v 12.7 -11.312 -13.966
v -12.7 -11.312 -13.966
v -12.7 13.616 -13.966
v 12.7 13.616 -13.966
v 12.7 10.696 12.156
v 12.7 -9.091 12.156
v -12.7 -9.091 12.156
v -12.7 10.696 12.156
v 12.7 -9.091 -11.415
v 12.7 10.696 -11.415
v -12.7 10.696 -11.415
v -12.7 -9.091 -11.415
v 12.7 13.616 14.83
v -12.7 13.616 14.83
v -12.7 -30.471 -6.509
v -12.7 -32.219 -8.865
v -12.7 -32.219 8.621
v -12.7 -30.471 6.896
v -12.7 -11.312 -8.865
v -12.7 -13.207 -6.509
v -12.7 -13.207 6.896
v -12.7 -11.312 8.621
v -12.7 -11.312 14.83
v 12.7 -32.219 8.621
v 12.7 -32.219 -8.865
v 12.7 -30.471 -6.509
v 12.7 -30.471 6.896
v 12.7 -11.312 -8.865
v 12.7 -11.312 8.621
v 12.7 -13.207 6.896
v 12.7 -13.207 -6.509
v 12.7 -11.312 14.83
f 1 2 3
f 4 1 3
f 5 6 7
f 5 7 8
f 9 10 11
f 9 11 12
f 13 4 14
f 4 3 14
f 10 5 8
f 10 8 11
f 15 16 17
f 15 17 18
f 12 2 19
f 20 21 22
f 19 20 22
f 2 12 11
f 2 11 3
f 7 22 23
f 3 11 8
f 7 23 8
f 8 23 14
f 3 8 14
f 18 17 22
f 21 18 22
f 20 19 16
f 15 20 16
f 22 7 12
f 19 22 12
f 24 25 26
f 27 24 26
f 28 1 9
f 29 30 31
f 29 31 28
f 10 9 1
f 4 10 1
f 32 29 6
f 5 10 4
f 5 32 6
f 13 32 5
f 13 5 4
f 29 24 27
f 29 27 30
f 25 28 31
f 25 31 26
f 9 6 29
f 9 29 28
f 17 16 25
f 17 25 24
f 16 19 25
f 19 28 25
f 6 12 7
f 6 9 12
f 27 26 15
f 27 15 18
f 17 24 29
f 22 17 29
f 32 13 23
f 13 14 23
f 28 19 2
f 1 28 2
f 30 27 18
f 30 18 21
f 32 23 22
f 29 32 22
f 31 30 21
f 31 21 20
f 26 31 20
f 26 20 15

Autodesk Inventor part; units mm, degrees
ref_plane "YZ Plane" through (0, 0, 0) normal (1, 0, 0) x (0, 1, 0)
ref_plane "XZ Plane" through (0, 0, 0) normal (0, 1, 0) x (-1, 0, 0)
ref_plane "XY Plane" through (0, 0, 0) normal (0, 0, 1) x (1, 0, 0)
sketch "Sketch1" plane through (0, 0, 0) normal (1, 0, 0) x (0, 1, 0)
  line L0 (13.6162, 14.8297) -> (-11.3125, 14.8297)
  line L1 (-11.3125, 14.8297) -> (-11.3125, -13.9659)
  line L2 (-11.3125, -13.9659) -> (13.6162, -13.9659)
  line L3 (13.6162, -13.9659) -> (13.6162, 14.8297)
extrude "Extrusion1" add sketch "Sketch1" along normal mid plane 25.4
sketch "Sketch2" plane through (12.7, 0, 0) normal (1, 0, 0) x (0, 0, -1)
  line L0 (-12.1558, 10.6955) -> (11.4154, 10.6955)
  line L1 (11.4154, 10.6955) -> (11.4154, -9.0912)
  line L2 (11.4154, -9.0912) -> (-12.1558, -9.0912)
  line L3 (-12.1558, -9.0912) -> (-12.1558, 10.6955)
  point P0 (0, 0)
extrude "Extrusion2" cut sketch "Sketch2" against normal blind 25.4
sketch "Sketch3" plane through (12.7, 0, 0) normal (1, 0, 0) x (0, 0, -1)
  line L0 (-14.8297, -11.3125) -> (13.9659, -11.3125) projected
  line L1 (-8.621, -11.3125) -> (8.8651, -11.3125)
  line L2 (8.8651, -11.3125) -> (8.8651, -32.2195)
  line L3 (8.8651, -32.2195) -> (-8.621, -32.2195)
  line L4 (-8.621, -32.2195) -> (-8.621, -11.3125)
  point P0 (0, 0)
extrude "Extrusion3" add sketch "Sketch3" against normal blind 25.4
sketch "Sketch4" plane through (12.7, 0, 0) normal (1, 0, 0) x (0, 0, -1)
  line L0 (-6.8955, -13.2073) -> (6.5094, -13.2073)
  line L1 (6.5094, -13.2073) -> (6.5094, -30.471)
  line L2 (6.5094, -30.471) -> (-6.8955, -30.471)
  line L3 (-6.8955, -30.471) -> (-6.8955, -13.2073)
  point P0 (0, 0)
extrude "Extrusion4" cut sketch "Sketch4" against normal blind 25.4
sketch "Sketch6" plane through (12.7, -32.2195, -8.8651) normal (0, -1, 0) x (1, 0, 0)
  point P0 (-12.7, 8.8651)
